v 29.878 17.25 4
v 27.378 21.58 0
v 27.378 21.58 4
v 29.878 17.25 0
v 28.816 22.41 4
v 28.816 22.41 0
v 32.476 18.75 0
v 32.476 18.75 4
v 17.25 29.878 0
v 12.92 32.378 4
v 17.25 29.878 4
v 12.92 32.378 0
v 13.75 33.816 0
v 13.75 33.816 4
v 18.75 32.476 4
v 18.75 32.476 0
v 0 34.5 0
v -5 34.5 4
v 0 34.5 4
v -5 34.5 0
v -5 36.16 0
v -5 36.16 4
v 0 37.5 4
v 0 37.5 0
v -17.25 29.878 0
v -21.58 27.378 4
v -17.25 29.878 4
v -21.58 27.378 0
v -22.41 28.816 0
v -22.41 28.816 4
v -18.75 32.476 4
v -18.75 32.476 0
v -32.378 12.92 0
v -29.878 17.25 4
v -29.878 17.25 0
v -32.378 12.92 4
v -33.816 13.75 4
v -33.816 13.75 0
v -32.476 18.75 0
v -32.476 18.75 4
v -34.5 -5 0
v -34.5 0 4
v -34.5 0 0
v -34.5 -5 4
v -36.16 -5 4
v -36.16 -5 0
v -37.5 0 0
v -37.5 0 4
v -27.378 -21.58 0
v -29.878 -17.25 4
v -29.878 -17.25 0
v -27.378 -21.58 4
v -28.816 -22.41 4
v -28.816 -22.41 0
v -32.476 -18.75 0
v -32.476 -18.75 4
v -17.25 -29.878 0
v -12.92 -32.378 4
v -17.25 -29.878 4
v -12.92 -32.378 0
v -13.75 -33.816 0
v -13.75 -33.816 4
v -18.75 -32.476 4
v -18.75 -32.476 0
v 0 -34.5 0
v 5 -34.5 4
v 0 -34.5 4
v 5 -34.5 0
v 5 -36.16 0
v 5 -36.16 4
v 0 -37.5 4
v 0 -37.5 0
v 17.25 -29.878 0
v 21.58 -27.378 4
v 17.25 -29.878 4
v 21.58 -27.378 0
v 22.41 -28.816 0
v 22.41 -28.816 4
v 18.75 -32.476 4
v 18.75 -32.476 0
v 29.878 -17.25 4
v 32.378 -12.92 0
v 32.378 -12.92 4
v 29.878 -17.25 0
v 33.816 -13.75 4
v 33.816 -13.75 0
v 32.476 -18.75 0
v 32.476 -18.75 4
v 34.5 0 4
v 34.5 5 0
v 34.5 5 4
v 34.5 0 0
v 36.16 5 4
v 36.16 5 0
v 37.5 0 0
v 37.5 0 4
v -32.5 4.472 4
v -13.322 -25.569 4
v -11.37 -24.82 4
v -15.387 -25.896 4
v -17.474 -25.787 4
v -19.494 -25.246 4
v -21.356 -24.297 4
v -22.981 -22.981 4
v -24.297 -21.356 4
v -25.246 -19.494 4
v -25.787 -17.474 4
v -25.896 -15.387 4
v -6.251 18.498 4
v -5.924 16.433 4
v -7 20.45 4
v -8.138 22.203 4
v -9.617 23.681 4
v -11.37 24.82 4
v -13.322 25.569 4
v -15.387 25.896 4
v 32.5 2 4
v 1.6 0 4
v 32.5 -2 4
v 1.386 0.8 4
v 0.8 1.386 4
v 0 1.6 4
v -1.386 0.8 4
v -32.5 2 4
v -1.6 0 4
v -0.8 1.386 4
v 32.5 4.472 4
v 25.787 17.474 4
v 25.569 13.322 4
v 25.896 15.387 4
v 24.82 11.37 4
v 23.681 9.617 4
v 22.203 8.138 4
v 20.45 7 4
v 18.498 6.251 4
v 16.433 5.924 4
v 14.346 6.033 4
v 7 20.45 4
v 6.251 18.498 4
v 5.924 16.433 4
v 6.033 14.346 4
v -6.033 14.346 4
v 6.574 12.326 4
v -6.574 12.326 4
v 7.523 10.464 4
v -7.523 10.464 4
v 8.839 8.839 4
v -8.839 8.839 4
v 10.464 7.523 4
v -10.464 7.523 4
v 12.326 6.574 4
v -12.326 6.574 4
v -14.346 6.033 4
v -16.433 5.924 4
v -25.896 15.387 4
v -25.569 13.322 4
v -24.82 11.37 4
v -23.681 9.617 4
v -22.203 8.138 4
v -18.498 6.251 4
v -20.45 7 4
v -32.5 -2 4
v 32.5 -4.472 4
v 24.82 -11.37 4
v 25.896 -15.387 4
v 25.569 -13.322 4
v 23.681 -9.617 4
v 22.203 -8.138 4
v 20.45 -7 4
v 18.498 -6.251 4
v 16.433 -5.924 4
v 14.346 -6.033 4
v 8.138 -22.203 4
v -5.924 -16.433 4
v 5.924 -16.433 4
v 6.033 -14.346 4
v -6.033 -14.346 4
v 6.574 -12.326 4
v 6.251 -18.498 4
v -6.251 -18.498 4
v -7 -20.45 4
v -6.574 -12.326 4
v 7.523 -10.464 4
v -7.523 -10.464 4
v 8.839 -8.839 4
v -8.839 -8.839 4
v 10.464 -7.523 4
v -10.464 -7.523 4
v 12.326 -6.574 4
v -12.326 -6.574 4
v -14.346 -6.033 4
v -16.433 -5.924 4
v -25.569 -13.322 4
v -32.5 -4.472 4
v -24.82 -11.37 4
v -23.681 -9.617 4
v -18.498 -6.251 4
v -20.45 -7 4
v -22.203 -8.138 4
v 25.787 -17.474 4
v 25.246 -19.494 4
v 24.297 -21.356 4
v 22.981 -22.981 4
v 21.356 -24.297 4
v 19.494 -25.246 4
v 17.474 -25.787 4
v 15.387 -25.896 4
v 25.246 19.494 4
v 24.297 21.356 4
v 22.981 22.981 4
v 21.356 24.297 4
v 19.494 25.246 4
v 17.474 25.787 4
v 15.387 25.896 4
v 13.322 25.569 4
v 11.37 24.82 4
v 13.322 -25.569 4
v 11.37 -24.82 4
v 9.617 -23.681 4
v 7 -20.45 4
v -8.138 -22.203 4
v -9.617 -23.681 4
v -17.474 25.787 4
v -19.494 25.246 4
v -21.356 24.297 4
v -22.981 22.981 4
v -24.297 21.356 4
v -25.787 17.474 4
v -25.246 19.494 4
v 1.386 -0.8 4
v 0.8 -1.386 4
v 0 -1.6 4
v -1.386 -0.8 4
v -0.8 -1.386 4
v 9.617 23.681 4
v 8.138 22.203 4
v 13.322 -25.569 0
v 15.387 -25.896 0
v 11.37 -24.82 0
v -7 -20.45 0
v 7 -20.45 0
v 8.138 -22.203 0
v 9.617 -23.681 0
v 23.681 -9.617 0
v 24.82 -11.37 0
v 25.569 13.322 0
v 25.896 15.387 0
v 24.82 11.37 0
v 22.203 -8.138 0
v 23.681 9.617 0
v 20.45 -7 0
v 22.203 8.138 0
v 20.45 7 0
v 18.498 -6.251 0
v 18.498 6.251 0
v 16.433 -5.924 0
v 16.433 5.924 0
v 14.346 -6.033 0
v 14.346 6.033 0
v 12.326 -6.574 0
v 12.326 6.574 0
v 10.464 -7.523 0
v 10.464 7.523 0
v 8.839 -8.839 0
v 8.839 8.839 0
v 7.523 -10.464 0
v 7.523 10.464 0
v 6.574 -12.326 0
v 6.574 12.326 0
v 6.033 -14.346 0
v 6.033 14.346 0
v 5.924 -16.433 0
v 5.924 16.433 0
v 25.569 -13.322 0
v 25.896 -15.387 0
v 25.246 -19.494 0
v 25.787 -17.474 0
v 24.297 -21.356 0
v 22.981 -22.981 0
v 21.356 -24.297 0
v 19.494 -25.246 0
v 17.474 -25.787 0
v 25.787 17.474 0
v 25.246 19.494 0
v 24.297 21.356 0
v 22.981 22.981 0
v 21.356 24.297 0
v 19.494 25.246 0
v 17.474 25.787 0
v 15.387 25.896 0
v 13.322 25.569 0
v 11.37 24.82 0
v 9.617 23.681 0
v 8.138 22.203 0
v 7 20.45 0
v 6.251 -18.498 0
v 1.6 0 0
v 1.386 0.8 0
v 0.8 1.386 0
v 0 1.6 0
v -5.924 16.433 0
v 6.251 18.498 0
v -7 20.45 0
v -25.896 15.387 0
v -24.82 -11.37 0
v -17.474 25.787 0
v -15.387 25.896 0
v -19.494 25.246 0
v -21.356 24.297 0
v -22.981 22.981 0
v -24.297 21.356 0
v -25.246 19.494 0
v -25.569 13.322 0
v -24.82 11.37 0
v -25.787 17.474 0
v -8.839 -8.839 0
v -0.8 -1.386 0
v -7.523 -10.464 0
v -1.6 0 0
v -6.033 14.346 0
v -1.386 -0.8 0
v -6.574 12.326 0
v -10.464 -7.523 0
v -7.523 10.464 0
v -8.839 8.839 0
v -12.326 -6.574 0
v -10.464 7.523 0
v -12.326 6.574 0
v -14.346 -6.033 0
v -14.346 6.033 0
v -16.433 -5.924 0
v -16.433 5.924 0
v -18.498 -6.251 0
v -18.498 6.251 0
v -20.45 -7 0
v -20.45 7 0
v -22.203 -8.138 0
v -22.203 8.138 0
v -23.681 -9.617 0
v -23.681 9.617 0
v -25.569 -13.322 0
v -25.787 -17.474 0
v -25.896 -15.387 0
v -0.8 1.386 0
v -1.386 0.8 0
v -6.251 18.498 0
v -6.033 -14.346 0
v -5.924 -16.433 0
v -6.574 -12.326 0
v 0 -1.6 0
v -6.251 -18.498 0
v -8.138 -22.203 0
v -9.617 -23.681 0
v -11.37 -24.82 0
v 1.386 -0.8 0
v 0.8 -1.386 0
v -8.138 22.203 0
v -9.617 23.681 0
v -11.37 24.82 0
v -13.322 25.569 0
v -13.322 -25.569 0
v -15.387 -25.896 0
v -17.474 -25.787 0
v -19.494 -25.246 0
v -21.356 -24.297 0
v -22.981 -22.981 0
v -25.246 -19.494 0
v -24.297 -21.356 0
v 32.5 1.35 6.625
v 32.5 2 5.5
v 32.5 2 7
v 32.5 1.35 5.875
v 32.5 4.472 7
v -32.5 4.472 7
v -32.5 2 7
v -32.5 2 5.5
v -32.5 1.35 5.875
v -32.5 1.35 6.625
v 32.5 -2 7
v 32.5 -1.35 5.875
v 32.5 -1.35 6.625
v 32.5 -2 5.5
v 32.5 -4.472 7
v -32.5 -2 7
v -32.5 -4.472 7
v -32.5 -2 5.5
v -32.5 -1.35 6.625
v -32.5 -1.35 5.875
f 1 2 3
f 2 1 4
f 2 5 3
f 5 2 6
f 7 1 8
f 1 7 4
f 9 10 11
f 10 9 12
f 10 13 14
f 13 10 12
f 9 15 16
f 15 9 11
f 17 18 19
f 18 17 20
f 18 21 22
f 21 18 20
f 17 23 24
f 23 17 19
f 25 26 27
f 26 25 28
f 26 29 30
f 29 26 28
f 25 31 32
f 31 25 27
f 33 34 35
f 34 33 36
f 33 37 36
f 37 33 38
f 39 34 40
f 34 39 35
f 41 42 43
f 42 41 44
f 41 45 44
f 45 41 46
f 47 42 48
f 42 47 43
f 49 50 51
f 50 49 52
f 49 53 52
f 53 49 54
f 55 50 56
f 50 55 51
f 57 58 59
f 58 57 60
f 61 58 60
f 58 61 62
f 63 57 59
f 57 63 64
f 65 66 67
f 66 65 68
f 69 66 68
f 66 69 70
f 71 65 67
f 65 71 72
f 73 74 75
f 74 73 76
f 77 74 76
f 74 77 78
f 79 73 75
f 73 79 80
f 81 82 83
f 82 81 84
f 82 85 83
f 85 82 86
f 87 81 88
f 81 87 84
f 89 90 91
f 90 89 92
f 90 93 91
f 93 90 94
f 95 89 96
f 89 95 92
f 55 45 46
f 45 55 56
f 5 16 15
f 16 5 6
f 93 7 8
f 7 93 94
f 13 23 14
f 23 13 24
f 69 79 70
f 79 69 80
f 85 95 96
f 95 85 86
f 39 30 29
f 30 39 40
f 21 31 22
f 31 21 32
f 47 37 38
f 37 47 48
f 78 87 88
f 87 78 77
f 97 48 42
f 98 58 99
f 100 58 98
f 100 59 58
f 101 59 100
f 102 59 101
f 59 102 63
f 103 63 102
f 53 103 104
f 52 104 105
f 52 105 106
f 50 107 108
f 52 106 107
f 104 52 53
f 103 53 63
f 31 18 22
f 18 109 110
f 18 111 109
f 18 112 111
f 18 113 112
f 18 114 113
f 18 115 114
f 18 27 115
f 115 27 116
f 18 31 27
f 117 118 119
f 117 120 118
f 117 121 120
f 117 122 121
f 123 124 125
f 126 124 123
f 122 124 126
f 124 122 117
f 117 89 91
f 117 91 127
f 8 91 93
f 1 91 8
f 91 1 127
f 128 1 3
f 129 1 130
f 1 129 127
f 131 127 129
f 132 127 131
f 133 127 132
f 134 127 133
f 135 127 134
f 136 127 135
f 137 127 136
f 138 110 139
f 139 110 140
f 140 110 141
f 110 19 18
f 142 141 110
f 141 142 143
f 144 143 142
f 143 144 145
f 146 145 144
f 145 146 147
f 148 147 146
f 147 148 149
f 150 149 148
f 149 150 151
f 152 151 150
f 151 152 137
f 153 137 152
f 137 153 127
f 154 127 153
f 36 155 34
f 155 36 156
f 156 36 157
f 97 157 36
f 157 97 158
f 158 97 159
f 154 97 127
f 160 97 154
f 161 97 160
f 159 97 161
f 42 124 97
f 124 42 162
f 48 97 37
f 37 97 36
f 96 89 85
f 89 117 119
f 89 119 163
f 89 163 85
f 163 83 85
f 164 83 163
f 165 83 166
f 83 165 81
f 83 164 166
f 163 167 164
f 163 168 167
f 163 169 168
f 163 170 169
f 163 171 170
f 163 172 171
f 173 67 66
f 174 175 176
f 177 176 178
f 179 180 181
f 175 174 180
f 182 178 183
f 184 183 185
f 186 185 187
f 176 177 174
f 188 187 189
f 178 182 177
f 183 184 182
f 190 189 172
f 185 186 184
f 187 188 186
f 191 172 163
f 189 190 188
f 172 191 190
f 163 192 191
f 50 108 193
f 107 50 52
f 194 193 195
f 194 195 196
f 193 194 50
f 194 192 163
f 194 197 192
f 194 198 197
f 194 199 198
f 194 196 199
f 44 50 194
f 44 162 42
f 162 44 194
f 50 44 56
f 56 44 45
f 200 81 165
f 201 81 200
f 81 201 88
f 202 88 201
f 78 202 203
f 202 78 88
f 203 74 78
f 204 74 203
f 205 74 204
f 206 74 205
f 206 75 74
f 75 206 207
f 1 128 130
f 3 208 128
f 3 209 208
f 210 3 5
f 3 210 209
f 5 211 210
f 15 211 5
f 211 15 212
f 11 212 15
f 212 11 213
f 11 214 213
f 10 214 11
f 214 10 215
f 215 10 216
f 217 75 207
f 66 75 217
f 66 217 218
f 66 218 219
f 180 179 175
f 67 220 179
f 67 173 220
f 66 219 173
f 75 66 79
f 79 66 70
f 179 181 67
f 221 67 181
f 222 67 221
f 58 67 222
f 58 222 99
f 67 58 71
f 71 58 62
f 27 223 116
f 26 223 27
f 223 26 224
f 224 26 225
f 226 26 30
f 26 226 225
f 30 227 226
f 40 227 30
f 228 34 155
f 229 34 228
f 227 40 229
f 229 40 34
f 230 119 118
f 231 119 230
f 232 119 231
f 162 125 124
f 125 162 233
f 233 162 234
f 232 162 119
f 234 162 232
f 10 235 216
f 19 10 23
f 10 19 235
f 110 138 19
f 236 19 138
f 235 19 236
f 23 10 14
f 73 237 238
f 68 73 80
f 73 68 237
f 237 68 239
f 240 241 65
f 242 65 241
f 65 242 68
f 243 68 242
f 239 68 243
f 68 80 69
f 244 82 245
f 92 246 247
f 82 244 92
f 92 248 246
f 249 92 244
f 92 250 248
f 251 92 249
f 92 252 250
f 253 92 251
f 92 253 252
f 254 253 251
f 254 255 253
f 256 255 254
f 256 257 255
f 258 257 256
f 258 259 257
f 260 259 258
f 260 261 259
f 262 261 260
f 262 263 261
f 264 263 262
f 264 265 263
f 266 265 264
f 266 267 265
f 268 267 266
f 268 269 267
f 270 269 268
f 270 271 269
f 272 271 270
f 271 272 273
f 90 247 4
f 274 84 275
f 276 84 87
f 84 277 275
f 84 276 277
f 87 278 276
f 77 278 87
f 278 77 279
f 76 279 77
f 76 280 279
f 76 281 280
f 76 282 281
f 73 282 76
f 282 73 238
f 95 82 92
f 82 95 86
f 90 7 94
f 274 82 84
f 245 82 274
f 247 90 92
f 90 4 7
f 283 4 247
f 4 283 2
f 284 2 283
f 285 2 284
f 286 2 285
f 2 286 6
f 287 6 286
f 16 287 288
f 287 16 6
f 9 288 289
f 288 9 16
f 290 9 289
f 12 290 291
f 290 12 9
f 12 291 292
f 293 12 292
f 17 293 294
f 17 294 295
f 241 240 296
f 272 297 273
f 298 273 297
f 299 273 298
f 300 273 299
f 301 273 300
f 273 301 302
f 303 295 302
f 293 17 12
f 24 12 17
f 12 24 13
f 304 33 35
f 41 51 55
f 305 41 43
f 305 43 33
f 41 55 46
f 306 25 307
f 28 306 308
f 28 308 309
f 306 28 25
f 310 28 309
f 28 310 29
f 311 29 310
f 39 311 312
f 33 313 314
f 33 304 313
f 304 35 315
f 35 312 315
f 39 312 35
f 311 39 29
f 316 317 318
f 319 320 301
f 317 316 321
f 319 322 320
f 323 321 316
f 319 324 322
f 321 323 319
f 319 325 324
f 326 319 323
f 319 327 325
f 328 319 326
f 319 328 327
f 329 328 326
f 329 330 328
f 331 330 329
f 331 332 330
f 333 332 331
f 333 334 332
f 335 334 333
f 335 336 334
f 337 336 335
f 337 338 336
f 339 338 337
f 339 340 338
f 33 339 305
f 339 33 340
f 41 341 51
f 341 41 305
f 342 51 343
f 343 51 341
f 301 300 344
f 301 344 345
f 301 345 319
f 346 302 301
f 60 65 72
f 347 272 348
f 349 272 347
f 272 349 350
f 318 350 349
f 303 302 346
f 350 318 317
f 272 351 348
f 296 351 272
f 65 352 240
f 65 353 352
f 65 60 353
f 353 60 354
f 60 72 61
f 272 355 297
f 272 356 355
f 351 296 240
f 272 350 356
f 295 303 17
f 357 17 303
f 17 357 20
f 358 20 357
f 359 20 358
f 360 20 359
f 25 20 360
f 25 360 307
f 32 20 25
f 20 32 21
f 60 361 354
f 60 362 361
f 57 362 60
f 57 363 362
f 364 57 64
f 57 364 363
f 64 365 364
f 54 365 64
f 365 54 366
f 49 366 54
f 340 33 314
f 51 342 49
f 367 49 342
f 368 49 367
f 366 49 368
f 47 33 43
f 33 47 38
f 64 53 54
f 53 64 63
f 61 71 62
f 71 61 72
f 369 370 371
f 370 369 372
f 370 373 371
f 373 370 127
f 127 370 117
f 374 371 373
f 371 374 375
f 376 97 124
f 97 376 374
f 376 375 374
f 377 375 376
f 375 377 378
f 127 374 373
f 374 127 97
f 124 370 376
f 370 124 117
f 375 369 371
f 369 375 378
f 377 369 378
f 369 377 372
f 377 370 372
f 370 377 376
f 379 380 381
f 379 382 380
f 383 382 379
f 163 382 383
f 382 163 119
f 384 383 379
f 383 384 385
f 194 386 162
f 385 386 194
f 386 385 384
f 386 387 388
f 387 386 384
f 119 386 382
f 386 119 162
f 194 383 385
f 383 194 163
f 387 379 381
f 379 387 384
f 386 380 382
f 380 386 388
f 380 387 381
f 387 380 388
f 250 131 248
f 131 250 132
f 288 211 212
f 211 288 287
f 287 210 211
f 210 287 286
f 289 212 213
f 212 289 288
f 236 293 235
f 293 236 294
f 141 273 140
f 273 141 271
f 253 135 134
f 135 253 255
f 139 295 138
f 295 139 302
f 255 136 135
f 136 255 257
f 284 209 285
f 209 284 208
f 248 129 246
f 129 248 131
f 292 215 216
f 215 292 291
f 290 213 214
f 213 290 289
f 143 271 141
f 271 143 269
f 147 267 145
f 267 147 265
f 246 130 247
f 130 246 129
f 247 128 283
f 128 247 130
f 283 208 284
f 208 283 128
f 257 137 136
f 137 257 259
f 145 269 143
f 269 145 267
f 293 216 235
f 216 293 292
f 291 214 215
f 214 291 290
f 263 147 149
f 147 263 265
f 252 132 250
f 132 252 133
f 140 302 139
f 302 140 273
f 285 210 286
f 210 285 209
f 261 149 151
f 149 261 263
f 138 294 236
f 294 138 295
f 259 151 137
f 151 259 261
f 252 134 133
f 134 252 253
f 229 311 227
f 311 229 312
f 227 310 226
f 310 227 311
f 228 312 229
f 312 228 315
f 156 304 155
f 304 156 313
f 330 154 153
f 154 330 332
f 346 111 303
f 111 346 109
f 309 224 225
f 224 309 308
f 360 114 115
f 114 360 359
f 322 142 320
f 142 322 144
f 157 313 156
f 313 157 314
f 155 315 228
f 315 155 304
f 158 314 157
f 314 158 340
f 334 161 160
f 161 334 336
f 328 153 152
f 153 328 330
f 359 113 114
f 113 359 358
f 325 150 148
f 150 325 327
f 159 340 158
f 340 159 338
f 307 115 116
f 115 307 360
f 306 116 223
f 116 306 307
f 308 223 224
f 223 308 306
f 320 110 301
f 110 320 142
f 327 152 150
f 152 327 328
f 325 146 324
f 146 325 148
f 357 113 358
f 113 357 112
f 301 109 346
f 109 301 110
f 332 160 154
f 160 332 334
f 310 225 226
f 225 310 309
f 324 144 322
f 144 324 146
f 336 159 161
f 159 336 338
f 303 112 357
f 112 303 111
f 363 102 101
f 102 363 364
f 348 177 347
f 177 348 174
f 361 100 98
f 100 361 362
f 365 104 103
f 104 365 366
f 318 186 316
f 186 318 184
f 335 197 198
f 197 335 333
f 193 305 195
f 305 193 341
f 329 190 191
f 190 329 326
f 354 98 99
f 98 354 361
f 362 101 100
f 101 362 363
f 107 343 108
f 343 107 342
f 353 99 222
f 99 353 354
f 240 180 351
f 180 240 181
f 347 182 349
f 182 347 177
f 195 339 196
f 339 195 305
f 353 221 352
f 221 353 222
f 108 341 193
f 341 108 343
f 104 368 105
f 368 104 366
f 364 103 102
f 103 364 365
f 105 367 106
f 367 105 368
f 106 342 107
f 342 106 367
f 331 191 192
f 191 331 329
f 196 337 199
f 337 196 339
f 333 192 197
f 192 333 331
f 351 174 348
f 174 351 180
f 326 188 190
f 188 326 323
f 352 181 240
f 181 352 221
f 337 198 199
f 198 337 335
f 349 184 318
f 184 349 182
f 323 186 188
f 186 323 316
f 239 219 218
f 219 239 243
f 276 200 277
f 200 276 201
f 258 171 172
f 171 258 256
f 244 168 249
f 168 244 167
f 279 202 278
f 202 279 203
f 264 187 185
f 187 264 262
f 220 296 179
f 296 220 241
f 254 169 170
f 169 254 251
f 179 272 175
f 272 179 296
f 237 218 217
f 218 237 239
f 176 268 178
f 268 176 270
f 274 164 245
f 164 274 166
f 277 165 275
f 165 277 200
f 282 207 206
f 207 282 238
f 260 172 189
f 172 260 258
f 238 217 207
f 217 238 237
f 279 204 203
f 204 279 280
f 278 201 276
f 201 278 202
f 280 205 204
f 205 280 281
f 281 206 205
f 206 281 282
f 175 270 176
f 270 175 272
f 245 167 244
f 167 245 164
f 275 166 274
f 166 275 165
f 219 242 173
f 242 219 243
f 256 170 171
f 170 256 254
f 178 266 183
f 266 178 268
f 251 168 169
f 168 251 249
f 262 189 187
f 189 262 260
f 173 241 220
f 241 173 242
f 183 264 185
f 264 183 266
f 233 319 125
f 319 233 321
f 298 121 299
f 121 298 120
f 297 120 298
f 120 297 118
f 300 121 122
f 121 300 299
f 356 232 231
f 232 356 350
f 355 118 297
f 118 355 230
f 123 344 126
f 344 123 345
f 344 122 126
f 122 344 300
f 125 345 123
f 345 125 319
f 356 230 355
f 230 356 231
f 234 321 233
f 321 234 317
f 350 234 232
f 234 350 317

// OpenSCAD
//toothstamp(depth=3, width=3, 4);
//tootheddisc(75/2, 4, 6, 3);
//groove(65/2, 4, 3);
//grooveholder(65/2, 4, 3);
//grooveddisc(64.5/2, 4, 4, 3);
groovedwheel(65/2, 75/2);
//cradle_samsungfocus();
//cradle_samsungfocusfat();

	goldenratio = 1.61803399;
	joinfactor = 0.25;

module toothstamp(depth, width, height)
{
	cube([depth, width, height]);
}

module tootheddisc(radius, height, teeth, toothdepth, toothwidth)
{
	toothrotation = 360 / teeth;	

	difference()
	{
		cylinder(h=height, r=radius);

		for(i=[1:teeth])
		{
			rotate([0, 0, i*toothrotation])
			translate([radius-toothdepth, 0, -joinfactor])
			toothstamp(toothdepth+joinfactor, toothwidth, height+joinfactor*2);
		}
	}
}

module grooveddisc(radius, height, slotwidth, slotdepth)
{
	grooveradius = slotdepth/4;

	union()
	{
		difference()
		{
			cylinder(r=radius, h=height);
	
			// subtract out the slot
			translate([-radius-joinfactor, -slotwidth/2, height-slotdepth])
			cube(size=[radius*2+joinfactor*2, slotwidth, slotdepth+joinfactor]);
		}

		// add in some cylinder action to form a fitting groove
		rotate([0, 90, 0])
		translate([-height+grooveradius, -slotwidth/2, -radius])
		cylinder(r=grooveradius, h =(radius*2), $fn=6); 

		rotate([0, 90, 0])
		translate([-height+grooveradius, +slotwidth/2, -radius])
		cylinder(r=grooveradius, h =(radius*2), $fn=6); 
	}
}

module groove(length, slotwidth, slotdepth)
{
	grooveradius = slotdepth/4;

	wallheight = slotdepth+joinfactor;
	walldepth = slotwidth/goldenratio;
	walllength = length;

	union()
	{
		// plus-y wall
		translate([0, slotwidth/2, 0])
		cube(size=[walllength, walldepth, wallheight]);

		rotate([0, 90, 0])
		translate([-wallheight+grooveradius, slotwidth/2, 0])
		cylinder(r=grooveradius, h = length, $fn=6); 

		// minus-y wall
		translate([0, -(slotwidth/2)-walldepth, 0])
		cube(size=[walllength, walldepth, wallheight]);

		rotate([0, 90, 0])
		translate([-wallheight+grooveradius, -(slotwidth/2), 0])
		cylinder(r=grooveradius, h = length, $fn=6); 
	}
}

module grooveholder(length, slotwidth, slotdepth)
{
	grooveradius = slotdepth/4;

	wallheight = slotdepth+joinfactor;
	walldepth = grooveradius;
	walllength = length;

	basewidth = slotwidth-joinfactor*2;
	baseheight = slotdepth-grooveradius*2;

	neckwidth = slotwidth-grooveradius*2-joinfactor;

	union()
	{
		translate([0, (basewidth-neckwidth)/2 , 0])
		cube(size=[walllength, neckwidth, grooveradius*2+joinfactor]);

		translate([0, 0, baseheight-joinfactor])
		cube(size=[walllength,basewidth, baseheight]);


	}
}

module groovedwheel(innerradius, outerradius)
{
	baseheight = 4;

	teeth = 12;
	toothdepth = 3;
	toothwidth = 5;

	stencils = 4;
	stencilradius = 10;
	stencilangle = 360 / stencils;

	diffradius = outerradius - innerradius;

	difference()
	{
		union()
		{
			tootheddisc(outerradius, baseheight, teeth, toothdepth, toothwidth, $fn=teeth);
	
			translate([-innerradius, 0, baseheight-joinfactor])
			groove(innerradius*2, 4, 3);
		}

		// subtract out some holes to reduce the amount of plastic on the base disc
		for (i=[0:stencils])
		{
			rotate([0, 0, (i*stencilangle)+45])
			translate([outerradius-stencilradius-diffradius, 0, -joinfactor])
			cylinder(r=stencilradius, h=baseheight+joinfactor*2);
		}

		// put an axle hole through the middle of the disc
		// to fit a M3 threaded bolt, or roughly that size
		translate([0,0,-joinfactor])
		cylinder(r=3.2/2, h = baseheight+joinfactor*2, $fn=12);
	}
}

// Phone clips
module cradle_samsungfocus()
{
	slotwidth = 4;
	slotdepth = 3;

	devicethickness = 12;
	devicecoverextent = 8;

	wallthickness = 3;
	supportwallheight = 20;
	sidewallheight = 10;

	union()
	{
		// long back support wall
		cube(size=[wallthickness, devicethickness+wallthickness*2, supportwallheight+wallthickness]);
	
		// base
		cube(size=[devicecoverextent+wallthickness, wallthickness*2+devicethickness, wallthickness]);
	
		// Side walls
		cube(size=[8+wallthickness, wallthickness, sidewallheight+wallthickness]);
	
		translate([0, wallthickness+devicethickness, 0])
		cube(size=[8+wallthickness, wallthickness, sidewallheight+wallthickness]);
	
		// put a groove on the back of it
		rotate([0, -90, 0])
		translate([0, ((devicethickness+wallthickness*2)-slotwidth)/2, 0])
		grooveholder(supportwallheight+wallthickness, slotwidth, slotdepth);
	}
}

module cradle_samsungfocusfat()
{
	slotwidth = 4;
	slotdepth = 3;

	devicethickness = 13.5;
	devicecoverextent = 16;

	wallthickness = 3;
	supportwallheight = 30;
	sidewallheight = 30;

	difference()
	{
		union()
		{
			// long back support wall
			cube(size=[wallthickness, devicethickness+wallthickness*2, supportwallheight+wallthickness]);
			
			// Side walls
			cube(size=[devicecoverextent+wallthickness, wallthickness, sidewallheight+wallthickness]);
		
			translate([0, wallthickness+devicethickness, 0])
			cube(size=[devicecoverextent+wallthickness, wallthickness, sidewallheight+wallthickness]);
		
			// put a groove on the back of it
			rotate([0, -90, 0])
			translate([0, ((devicethickness+wallthickness*2)-slotwidth)/2, 0])
			grooveholder(supportwallheight+wallthickness, slotwidth, slotdepth);
		}
	}
}
